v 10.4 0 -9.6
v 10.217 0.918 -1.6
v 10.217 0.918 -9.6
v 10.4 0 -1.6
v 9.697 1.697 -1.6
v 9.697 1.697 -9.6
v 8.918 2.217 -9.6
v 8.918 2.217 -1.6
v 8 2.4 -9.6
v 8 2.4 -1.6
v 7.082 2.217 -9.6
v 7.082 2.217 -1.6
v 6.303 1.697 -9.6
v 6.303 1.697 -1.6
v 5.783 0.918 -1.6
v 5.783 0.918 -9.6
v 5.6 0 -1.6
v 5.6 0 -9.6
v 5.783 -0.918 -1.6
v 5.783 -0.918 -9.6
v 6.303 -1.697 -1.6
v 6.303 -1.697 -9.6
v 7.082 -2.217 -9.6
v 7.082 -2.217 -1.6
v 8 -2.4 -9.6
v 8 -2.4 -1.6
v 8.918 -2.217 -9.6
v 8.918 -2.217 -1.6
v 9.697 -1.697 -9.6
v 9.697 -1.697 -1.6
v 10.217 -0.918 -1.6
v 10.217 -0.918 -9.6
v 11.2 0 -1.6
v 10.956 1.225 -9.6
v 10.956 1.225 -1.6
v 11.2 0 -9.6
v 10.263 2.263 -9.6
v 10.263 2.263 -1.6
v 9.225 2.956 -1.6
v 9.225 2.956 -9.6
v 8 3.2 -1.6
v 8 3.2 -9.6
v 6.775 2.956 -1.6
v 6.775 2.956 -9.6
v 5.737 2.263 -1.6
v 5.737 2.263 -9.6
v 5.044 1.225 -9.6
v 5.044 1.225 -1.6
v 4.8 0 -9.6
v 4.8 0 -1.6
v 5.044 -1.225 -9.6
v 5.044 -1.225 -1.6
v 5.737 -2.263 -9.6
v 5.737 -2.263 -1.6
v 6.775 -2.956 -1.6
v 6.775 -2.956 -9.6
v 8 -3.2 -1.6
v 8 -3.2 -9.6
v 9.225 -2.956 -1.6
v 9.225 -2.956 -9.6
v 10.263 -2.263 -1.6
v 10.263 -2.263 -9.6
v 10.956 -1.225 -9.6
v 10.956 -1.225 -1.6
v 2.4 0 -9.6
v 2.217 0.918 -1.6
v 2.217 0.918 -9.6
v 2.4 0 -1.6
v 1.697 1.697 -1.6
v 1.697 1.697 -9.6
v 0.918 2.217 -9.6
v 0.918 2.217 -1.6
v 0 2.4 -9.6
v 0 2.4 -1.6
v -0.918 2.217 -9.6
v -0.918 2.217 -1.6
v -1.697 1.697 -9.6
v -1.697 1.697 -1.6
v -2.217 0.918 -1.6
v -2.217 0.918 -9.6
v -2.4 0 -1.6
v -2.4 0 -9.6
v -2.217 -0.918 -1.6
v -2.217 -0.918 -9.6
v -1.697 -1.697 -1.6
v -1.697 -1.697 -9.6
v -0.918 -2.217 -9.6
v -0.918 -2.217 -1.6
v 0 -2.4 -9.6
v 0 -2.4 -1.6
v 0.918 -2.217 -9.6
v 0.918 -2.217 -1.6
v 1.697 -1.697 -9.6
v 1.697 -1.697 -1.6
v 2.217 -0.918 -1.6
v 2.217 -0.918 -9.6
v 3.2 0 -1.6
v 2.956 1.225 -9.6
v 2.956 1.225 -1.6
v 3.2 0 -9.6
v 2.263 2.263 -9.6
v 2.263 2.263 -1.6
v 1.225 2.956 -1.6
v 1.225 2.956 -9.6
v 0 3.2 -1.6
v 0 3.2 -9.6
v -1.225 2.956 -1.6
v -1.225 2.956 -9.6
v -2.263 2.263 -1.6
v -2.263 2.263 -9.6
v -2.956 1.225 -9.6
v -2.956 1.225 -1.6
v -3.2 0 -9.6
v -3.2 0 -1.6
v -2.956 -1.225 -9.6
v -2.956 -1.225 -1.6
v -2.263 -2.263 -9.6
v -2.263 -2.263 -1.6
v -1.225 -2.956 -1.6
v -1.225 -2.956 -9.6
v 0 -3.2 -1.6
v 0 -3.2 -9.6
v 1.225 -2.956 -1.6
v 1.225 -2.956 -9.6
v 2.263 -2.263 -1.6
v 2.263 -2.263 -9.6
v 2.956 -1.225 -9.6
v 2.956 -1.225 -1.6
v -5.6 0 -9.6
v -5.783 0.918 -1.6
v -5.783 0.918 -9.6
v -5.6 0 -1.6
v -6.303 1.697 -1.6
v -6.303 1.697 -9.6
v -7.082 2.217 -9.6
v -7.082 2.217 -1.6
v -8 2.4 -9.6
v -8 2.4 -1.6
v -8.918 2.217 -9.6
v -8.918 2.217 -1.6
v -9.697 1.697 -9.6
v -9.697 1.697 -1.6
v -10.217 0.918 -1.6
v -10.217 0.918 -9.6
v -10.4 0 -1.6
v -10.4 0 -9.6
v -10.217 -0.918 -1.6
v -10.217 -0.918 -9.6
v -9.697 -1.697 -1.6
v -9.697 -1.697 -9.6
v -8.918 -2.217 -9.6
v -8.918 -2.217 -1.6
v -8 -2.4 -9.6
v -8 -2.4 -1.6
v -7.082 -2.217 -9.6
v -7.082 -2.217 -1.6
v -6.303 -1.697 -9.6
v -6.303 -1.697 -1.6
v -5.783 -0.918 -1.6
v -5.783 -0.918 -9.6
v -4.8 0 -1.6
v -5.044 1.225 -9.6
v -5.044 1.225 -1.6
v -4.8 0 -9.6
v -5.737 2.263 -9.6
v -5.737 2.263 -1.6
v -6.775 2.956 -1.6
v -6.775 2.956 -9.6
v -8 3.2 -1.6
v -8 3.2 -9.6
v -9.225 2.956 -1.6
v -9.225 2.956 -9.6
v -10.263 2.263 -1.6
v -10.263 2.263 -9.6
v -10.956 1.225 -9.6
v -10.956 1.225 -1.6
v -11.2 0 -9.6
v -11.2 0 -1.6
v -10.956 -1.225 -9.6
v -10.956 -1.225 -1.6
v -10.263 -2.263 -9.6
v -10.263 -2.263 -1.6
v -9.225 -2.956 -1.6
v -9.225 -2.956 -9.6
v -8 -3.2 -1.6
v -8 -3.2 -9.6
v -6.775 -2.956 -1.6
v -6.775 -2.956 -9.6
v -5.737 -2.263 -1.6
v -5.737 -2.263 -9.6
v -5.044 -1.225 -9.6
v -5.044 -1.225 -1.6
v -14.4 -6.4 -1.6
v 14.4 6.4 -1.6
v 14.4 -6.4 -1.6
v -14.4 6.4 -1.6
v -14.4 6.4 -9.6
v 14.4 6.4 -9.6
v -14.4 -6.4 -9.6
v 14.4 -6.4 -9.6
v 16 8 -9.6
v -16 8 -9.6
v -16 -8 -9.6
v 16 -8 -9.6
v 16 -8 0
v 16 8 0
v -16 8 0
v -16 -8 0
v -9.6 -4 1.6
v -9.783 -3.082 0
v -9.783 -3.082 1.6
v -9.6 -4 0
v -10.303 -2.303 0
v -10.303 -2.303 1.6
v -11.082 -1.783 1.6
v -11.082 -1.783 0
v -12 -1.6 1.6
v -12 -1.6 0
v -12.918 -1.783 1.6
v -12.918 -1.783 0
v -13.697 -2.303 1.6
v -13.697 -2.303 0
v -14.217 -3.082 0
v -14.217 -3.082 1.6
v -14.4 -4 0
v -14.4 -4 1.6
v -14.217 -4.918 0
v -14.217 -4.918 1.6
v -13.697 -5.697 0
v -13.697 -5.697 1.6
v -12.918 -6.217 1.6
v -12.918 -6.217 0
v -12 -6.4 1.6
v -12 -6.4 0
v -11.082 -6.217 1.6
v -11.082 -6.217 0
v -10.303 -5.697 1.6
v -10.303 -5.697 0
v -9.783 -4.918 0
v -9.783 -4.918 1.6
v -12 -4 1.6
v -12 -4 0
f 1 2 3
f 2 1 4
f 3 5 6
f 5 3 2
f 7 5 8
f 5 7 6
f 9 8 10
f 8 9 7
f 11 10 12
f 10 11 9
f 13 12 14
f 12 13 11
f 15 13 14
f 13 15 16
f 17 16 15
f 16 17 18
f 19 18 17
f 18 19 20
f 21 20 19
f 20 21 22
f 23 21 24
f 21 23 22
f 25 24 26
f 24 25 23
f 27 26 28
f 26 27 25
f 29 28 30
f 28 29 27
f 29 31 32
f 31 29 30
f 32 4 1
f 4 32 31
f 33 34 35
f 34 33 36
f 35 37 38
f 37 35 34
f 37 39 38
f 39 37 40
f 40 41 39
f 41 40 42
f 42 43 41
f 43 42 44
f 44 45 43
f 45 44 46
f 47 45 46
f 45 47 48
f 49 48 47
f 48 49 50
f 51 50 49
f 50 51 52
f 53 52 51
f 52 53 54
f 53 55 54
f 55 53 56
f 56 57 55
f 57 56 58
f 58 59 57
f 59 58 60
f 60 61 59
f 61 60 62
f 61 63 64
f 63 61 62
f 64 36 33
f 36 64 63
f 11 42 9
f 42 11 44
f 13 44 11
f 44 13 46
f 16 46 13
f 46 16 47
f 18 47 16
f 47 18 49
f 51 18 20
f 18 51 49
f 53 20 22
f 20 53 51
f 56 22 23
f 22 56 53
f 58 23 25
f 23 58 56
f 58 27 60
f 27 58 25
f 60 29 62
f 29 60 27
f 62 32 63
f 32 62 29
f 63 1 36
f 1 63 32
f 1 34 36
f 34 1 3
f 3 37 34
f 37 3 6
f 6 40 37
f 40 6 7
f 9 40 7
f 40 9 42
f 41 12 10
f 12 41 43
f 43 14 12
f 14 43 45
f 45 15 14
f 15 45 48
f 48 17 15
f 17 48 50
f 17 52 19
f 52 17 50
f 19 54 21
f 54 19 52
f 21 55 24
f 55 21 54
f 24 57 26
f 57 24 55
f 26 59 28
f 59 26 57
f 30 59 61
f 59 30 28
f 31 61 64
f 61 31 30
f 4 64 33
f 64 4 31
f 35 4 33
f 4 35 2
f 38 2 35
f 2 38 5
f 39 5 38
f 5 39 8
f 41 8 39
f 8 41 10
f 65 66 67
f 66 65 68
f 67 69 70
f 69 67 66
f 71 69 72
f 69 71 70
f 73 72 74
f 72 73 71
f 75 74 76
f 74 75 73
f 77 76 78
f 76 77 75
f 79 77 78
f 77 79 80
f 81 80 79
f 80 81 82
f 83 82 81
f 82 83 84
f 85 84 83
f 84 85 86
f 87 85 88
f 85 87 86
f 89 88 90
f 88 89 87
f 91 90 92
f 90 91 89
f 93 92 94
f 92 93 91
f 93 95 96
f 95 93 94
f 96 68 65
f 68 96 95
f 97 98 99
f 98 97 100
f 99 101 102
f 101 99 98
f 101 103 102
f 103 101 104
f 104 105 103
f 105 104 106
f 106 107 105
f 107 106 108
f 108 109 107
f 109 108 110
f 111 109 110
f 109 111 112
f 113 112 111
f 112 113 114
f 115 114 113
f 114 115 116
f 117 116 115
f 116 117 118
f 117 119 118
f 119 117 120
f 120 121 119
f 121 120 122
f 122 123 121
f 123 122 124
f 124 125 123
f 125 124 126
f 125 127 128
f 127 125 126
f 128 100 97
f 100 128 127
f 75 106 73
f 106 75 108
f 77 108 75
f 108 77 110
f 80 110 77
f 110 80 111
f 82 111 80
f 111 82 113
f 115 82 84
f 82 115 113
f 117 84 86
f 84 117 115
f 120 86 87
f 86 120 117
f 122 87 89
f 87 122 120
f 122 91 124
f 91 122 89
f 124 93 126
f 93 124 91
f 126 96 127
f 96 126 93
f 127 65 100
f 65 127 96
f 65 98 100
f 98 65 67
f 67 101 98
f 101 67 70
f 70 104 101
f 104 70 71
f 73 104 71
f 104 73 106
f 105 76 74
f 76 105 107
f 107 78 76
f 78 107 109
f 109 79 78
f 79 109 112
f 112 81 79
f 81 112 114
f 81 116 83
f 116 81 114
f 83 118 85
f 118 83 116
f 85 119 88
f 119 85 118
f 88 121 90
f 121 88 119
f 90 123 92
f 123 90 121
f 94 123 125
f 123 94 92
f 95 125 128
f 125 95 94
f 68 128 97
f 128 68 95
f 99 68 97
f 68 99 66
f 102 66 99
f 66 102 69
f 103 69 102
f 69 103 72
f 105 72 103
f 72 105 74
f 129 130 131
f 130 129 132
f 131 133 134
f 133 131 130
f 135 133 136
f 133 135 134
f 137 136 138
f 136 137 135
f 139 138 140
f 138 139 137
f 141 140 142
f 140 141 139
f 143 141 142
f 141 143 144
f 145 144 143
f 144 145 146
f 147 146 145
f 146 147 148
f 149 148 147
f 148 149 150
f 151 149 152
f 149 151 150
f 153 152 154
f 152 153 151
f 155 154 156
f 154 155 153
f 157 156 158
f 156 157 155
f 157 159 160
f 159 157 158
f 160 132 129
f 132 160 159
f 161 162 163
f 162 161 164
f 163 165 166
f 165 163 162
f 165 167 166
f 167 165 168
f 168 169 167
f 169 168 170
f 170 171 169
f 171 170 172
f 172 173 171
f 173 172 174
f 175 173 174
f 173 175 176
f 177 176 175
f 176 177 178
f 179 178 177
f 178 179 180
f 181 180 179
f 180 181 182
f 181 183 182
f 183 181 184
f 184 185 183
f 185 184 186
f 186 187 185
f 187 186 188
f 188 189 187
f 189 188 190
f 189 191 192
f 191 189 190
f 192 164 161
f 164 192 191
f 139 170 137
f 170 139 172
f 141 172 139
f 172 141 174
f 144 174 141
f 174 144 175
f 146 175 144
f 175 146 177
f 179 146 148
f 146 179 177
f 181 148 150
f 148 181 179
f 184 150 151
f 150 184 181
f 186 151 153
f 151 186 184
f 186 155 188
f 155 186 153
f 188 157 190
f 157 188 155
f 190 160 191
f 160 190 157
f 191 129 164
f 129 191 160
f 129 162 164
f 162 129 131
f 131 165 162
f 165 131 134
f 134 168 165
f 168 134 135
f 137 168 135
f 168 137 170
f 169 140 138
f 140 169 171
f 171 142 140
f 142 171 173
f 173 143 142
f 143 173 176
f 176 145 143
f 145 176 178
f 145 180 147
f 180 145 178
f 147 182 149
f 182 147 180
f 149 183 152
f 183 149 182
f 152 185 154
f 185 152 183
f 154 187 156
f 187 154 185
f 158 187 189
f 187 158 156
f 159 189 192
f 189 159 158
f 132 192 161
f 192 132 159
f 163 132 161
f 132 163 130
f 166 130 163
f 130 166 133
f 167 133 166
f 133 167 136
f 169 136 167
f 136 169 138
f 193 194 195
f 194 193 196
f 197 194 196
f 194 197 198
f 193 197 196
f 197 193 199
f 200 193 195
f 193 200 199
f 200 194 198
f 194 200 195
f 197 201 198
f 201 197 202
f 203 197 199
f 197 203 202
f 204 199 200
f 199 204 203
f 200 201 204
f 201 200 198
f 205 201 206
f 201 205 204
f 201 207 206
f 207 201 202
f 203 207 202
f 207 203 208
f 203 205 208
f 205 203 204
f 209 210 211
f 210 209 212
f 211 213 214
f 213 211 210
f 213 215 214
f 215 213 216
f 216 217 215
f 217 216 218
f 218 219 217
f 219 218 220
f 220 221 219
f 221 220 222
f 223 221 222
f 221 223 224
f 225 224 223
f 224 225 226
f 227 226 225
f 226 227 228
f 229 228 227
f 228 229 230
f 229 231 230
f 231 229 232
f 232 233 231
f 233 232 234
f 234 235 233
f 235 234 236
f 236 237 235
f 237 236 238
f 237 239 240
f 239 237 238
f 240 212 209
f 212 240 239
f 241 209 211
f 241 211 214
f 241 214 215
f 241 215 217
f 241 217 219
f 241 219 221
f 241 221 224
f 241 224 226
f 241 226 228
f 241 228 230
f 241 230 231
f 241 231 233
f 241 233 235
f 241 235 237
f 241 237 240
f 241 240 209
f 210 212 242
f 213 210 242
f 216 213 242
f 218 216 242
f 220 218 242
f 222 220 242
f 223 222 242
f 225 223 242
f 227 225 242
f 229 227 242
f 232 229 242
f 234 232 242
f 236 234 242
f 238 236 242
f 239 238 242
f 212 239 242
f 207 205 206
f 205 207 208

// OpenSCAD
// file: ../p/4-4ring3.scad
use <../lib.scad>
$fa=1; $fs=0.2;
function ldraw_lib__4_4ring3(realsolid=false) = [
// 0 Ring  3 x 1.0
// 0 Name: 4-4ring3.dat
// 0 Author: James Jessiman
// 0 !LDRAW_ORG Primitive UPDATE 2009-01
// 0 !LICENSE Licensed under CC BY 2.0 and CC BY 4.0 : see CAreadme.txt
// 
// 0 BFC CERTIFY CCW
  [0,"BFC","CERTIFY"],
  [0,"BFC","CCW"],
// 
// 0 !HISTORY 1998-12-15 [PTadmin] Official Update 1998-10
// 0 !HISTORY 2002-04-05 [hafhead] Added BFC statement
// 0 !HISTORY 2002-04-25 [PTadmin] Official Update 2002-02
// 0 !HISTORY 2007-06-24 [PTadmin] Header formatted for Contributor Agreement
// 0 !HISTORY 2008-07-01 [PTadmin] Official Update 2008-01
// 0 !HISTORY 2008-08-26 [cwdee] Switch polygon winding and rename
// 0 !HISTORY 2009-05-02 [PTadmin] Official Update 2009-01
// 
// 
// 4 16 -1.5308 0 3.6956 -1.1481 0 2.7717 0 0 3 0 0 4
  [4,16,-1.5308,0,3.6956,-1.1481,0,2.7717,0,0,3,0,0,4],
// 4 16 -2.8284 0 2.8284 -2.1213 0 2.1213 -1.1481 0 2.7717 -1.5308 0 3.6956
  [4,16,-2.8284,0,2.8284,-2.1213,0,2.1213,-1.1481,0,2.7717,-1.5308,0,3.6956],
// 4 16 -3.6956 0 1.5308 -2.7717 0 1.1481 -2.1213 0 2.1213 -2.8284 0 2.8284
  [4,16,-3.6956,0,1.5308,-2.7717,0,1.1481,-2.1213,0,2.1213,-2.8284,0,2.8284],
// 4 16 -4 0 0 -3 0 0 -2.7717 0 1.1481 -3.6956 0 1.5308
  [4,16,-4,0,0,-3,0,0,-2.7717,0,1.1481,-3.6956,0,1.5308],
// 4 16 -3.6956 0 -1.5308 -2.7717 0 -1.1481 -3 0 0 -4 0 0
  [4,16,-3.6956,0,-1.5308,-2.7717,0,-1.1481,-3,0,0,-4,0,0],
// 4 16 -2.8284 0 -2.8284 -2.1213 0 -2.1213 -2.7717 0 -1.1481 -3.6956 0 -1.5308
  [4,16,-2.8284,0,-2.8284,-2.1213,0,-2.1213,-2.7717,0,-1.1481,-3.6956,0,-1.5308],
// 4 16 -1.5308 0 -3.6956 -1.1481 0 -2.7717 -2.1213 0 -2.1213 -2.8284 0 -2.8284
  [4,16,-1.5308,0,-3.6956,-1.1481,0,-2.7717,-2.1213,0,-2.1213,-2.8284,0,-2.8284],
// 4 16 0 0 -4 0 0 -3 -1.1481 0 -2.7717 -1.5308 0 -3.6956
  [4,16,0,0,-4,0,0,-3,-1.1481,0,-2.7717,-1.5308,0,-3.6956],
// 4 16 1.5308 0 -3.6956 1.1481 0 -2.7717 0 0 -3 0 0 -4
  [4,16,1.5308,0,-3.6956,1.1481,0,-2.7717,0,0,-3,0,0,-4],
// 4 16 2.8284 0 -2.8284 2.1213 0 -2.1213 1.1481 0 -2.7717 1.5308 0 -3.6956
  [4,16,2.8284,0,-2.8284,2.1213,0,-2.1213,1.1481,0,-2.7717,1.5308,0,-3.6956],
// 4 16 3.6956 0 -1.5308 2.7717 0 -1.1481 2.1213 0 -2.1213 2.8284 0 -2.8284
  [4,16,3.6956,0,-1.5308,2.7717,0,-1.1481,2.1213,0,-2.1213,2.8284,0,-2.8284],
// 4 16 4 0 0 3 0 0 2.7717 0 -1.1481 3.6956 0 -1.5308
  [4,16,4,0,0,3,0,0,2.7717,0,-1.1481,3.6956,0,-1.5308],
// 4 16 3.6956 0 1.5308 2.7717 0 1.1481 3 0 0 4 0 0
  [4,16,3.6956,0,1.5308,2.7717,0,1.1481,3,0,0,4,0,0],
// 4 16 2.8284 0 2.8284 2.1213 0 2.1213 2.7717 0 1.1481 3.6956 0 1.5308
  [4,16,2.8284,0,2.8284,2.1213,0,2.1213,2.7717,0,1.1481,3.6956,0,1.5308],
// 4 16 1.5308 0 3.6956 1.1481 0 2.7717 2.1213 0 2.1213 2.8284 0 2.8284
  [4,16,1.5308,0,3.6956,1.1481,0,2.7717,2.1213,0,2.1213,2.8284,0,2.8284],
// 4 16 0 0 4 0 0 3 1.1481 0 2.7717 1.5308 0 3.6956
  [4,16,0,0,4,0,0,3,1.1481,0,2.7717,1.5308,0,3.6956],
// 0
];
module ldraw_lib__4_4ring3(step=0, col=false, unit=2/5, alt=false, line=0.2, solid=!$preview)
    makepoly(ldraw_lib__4_4ring3(solid), step=step, col=col, unit=unit, alt=alt, line=line, solid=solid);
ldraw_lib__4_4ring3(line=0.2);
// file: ../p/4-4edge.scad
use <../lib.scad>
function ldraw_lib__4_4edge() = [
// 0 Circle 1.0
// 0 Name: 4-4edge.dat
// 0 Author: James Jessiman
// 0 !LDRAW_ORG Primitive UPDATE 2017-01
// 0 !LICENSE Licensed under CC BY 2.0 and CC BY 4.0 : see CAreadme.txt
// 
// 0 BFC CERTIFY CCW
  [0,"BFC","CERTIFY"],
  [0,"BFC","CCW"],
// 
// 0 !HISTORY 1998-12-15 [PTadmin] Official Update 1998-10
// 0 !HISTORY 2005-12-28 [PTadmin] Official Update 2005-01
// 0 !HISTORY 2007-06-24 [PTadmin] Header formatted for Contributor Agreement
// 0 !HISTORY 2008-07-01 [PTadmin] Official Update 2008-01
// 0 !HISTORY 2017-01-15 [Steffen] BFCed
// 0 !HISTORY 2017-12-30 [PTadmin] Official Update 2017-01
// 
// 
// 2 24 1 0 0 0.9239 0 0.3827
  [2,24,1,0,0,0.9239,0,0.3827],
// 2 24 0.9239 0 0.3827 0.7071 0 0.7071
  [2,24,0.9239,0,0.3827,0.7071,0,0.7071],
// 2 24 0.7071 0 0.7071 0.3827 0 0.9239
  [2,24,0.7071,0,0.7071,0.3827,0,0.9239],
// 2 24 0.3827 0 0.9239 0 0 1
  [2,24,0.3827,0,0.9239,0,0,1],
// 2 24 0 0 1 -0.3827 0 0.9239
  [2,24,0,0,1,-0.3827,0,0.9239],
// 2 24 -0.3827 0 0.9239 -0.7071 0 0.7071
  [2,24,-0.3827,0,0.9239,-0.7071,0,0.7071],
// 2 24 -0.7071 0 0.7071 -0.9239 0 0.3827
  [2,24,-0.7071,0,0.7071,-0.9239,0,0.3827],
// 2 24 -0.9239 0 0.3827 -1 0 -0
  [2,24,-0.9239,0,0.3827,-1,0,-0],
// 2 24 -1 0 -0 -0.9239 0 -0.3827
  [2,24,-1,0,-0,-0.9239,0,-0.3827],
// 2 24 -0.9239 0 -0.3827 -0.7071 0 -0.7071
  [2,24,-0.9239,0,-0.3827,-0.7071,0,-0.7071],
// 2 24 -0.7071 0 -0.7071 -0.3827 0 -0.9239
  [2,24,-0.7071,0,-0.7071,-0.3827,0,-0.9239],
// 2 24 -0.3827 0 -0.9239 0 0 -1
  [2,24,-0.3827,0,-0.9239,0,0,-1],
// 2 24 0 0 -1 0.3827 0 -0.9239
  [2,24,0,0,-1,0.3827,0,-0.9239],
// 2 24 0.3827 0 -0.9239 0.7071 0 -0.7071
  [2,24,0.3827,0,-0.9239,0.7071,0,-0.7071],
// 2 24 0.7071 0 -0.7071 0.9239 0 -0.3827
  [2,24,0.7071,0,-0.7071,0.9239,0,-0.3827],
// 2 24 0.9239 0 -0.3827 1 0 0
  [2,24,0.9239,0,-0.3827,1,0,0],
];
module ldraw_lib__4_4edge(step=0, col=false, unit=2/5, alt=false, line=0.2, solid=!$preview)
    makepoly(ldraw_lib__4_4edge(), step=step, col=col, unit=unit, alt=alt, line=line, solid=solid);
ldraw_lib__4_4edge(line=0.2);
// file: ../p/4-4disc.scad
use <../lib.scad>
function ldraw_lib__4_4disc() = [
// 0 Disc 1.0
// 0 Name: 4-4disc.dat
// 0 Author: James Jessiman
// 0 !LDRAW_ORG Primitive UPDATE 2002-02
// 0 !LICENSE Licensed under CC BY 2.0 and CC BY 4.0 : see CAreadme.txt
// 
// 0 BFC CERTIFY CCW
  [0,"BFC","CERTIFY"],
  [0,"BFC","CCW"],
// 
// 0 !HISTORY 1998-12-15 [PTadmin] Official Update 1998-10
// 0 !HISTORY 2002-03-23 [sbliss] Added BFC statement
// 0 !HISTORY 2002-04-25 [PTadmin] Official Update 2002-02
// 0 !HISTORY 2007-06-24 [PTadmin] Header formatted for Contributor Agreement
// 0 !HISTORY 2008-07-01 [PTadmin] Official Update 2008-01
// 
// 
// 3 16 0 0 0 1 0 0 0.9239 0 0.3827
  [3,16,0,0,0,1,0,0,0.9239,0,0.3827],
// 3 16 0 0 0 0.9239 0 0.3827 0.7071 0 0.7071
  [3,16,0,0,0,0.9239,0,0.3827,0.7071,0,0.7071],
// 3 16 0 0 0 0.7071 0 0.7071 0.3827 0 0.9239
  [3,16,0,0,0,0.7071,0,0.7071,0.3827,0,0.9239],
// 3 16 0 0 0 0.3827 0 0.9239 0 0 1
  [3,16,0,0,0,0.3827,0,0.9239,0,0,1],
// 3 16 0 0 0 0 0 1 -0.3827 0 0.9239
  [3,16,0,0,0,0,0,1,-0.3827,0,0.9239],
// 3 16 0 0 0 -0.3827 0 0.9239 -0.7071 0 0.7071
  [3,16,0,0,0,-0.3827,0,0.9239,-0.7071,0,0.7071],
// 3 16 0 0 0 -0.7071 0 0.7071 -0.9239 0 0.3827
  [3,16,0,0,0,-0.7071,0,0.7071,-0.9239,0,0.3827],
// 3 16 0 0 0 -0.9239 0 0.3827 -1 0 -0
  [3,16,0,0,0,-0.9239,0,0.3827,-1,0,-0],
// 3 16 0 0 0 -1 0 -0 -0.9239 0 -0.3827
  [3,16,0,0,0,-1,0,-0,-0.9239,0,-0.3827],
// 3 16 0 0 0 -0.9239 0 -0.3827 -0.7071 0 -0.7071
  [3,16,0,0,0,-0.9239,0,-0.3827,-0.7071,0,-0.7071],
// 3 16 0 0 0 -0.7071 0 -0.7071 -0.3827 0 -0.9239
  [3,16,0,0,0,-0.7071,0,-0.7071,-0.3827,0,-0.9239],
// 3 16 0 0 0 -0.3827 0 -0.9239 0 0 -1
  [3,16,0,0,0,-0.3827,0,-0.9239,0,0,-1],
// 3 16 0 0 0 0 0 -1 0.3827 0 -0.9239
  [3,16,0,0,0,0,0,-1,0.3827,0,-0.9239],
// 3 16 0 0 0 0.3827 0 -0.9239 0.7071 0 -0.7071
  [3,16,0,0,0,0.3827,0,-0.9239,0.7071,0,-0.7071],
// 3 16 0 0 0 0.7071 0 -0.7071 0.9239 0 -0.3827
  [3,16,0,0,0,0.7071,0,-0.7071,0.9239,0,-0.3827],
// 3 16 0 0 0 0.9239 0 -0.3827 1 0 0
  [3,16,0,0,0,0.9239,0,-0.3827,1,0,0],
// 0
];
module ldraw_lib__4_4disc(step=0, col=false, unit=2/5, alt=false, line=0.2, solid=!$preview)
    makepoly(ldraw_lib__4_4disc(), step=step, col=col, unit=unit, alt=alt, line=line, solid=solid);
ldraw_lib__4_4disc(line=0.2);
// file: ../p/4-4cyli.scad
use <../lib.scad>
$fa=1; $fs=0.2;
function ldraw_lib__4_4cyli(realsolid=false) = [
// 0 Cylinder 1.0
// 0 Name: 4-4cyli.dat
// 0 Author: James Jessiman
// 0 !LDRAW_ORG Primitive UPDATE 2005-01
// 0 !LICENSE Licensed under CC BY 2.0 and CC BY 4.0 : see CAreadme.txt
// 
// 0 BFC CERTIFY CCW
  [0,"BFC","CERTIFY"],
  [0,"BFC","CCW"],
// 
// 0 !HISTORY 1998-12-15 [PTadmin] Official Update 1998-10
// 0 !HISTORY 2002-03-23 [sbliss] Added BFC statement; merged headers from files in distributions LDraw 0.27 and Complete.
// 0 !HISTORY 2002-04-25 [PTadmin] Official Update 2002-02
// 0 !HISTORY 2004-12-14 [guyvivan] BFC CCW
// 0 !HISTORY 2005-12-28 [PTadmin] Official Update 2005-01
// 0 !HISTORY 2007-06-24 [PTadmin] Header formatted for Contributor Agreement
// 0 !HISTORY 2008-07-01 [PTadmin] Official Update 2008-01
// 
// 
// 4 16 1 1 0 0.9239 1 0.3827 0.9239 0 0.3827 1 0 0
  [4,16,1,1,0,0.9239,1,0.3827,0.9239,0,0.3827,1,0,0],
// 5 24 1 0 0 1 1 0 0.9239 0 0.3827 0.9239 0 -0.3827
  [5,24,1,0,0,1,1,0,0.9239,0,0.3827,0.9239,0,-0.3827],
// 4 16 0.9239 1 0.3827 0.7071 1 0.7071 0.7071 0 0.7071 0.9239 0 0.3827
  [4,16,0.9239,1,0.3827,0.7071,1,0.7071,0.7071,0,0.7071,0.9239,0,0.3827],
// 5 24 0.9239 0 0.3827 0.9239 1 0.3827 0.7071 0 0.7071 1 0 0
  [5,24,0.9239,0,0.3827,0.9239,1,0.3827,0.7071,0,0.7071,1,0,0],
// 4 16 0.7071 1 0.7071 0.3827 1 0.9239 0.3827 0 0.9239 0.7071 0 0.7071
  [4,16,0.7071,1,0.7071,0.3827,1,0.9239,0.3827,0,0.9239,0.7071,0,0.7071],
// 5 24 0.7071 0 0.7071 0.7071 1 0.7071 0.3827 0 0.9239 0.9239 0 0.3827
  [5,24,0.7071,0,0.7071,0.7071,1,0.7071,0.3827,0,0.9239,0.9239,0,0.3827],
// 4 16 0.3827 1 0.9239 0 1 1 0 0 1 0.3827 0 0.9239
  [4,16,0.3827,1,0.9239,0,1,1,0,0,1,0.3827,0,0.9239],
// 5 24 0.3827 0 0.9239 0.3827 1 0.9239 0 0 1 0.7071 0 0.7071
  [5,24,0.3827,0,0.9239,0.3827,1,0.9239,0,0,1,0.7071,0,0.7071],
// 4 16 0 1 1 -0.3827 1 0.9239 -0.3827 0 0.9239 0 0 1
  [4,16,0,1,1,-0.3827,1,0.9239,-0.3827,0,0.9239,0,0,1],
// 5 24 0 0 1 0 1 1 -0.3827 0 0.9239 0.3827 0 0.9239
  [5,24,0,0,1,0,1,1,-0.3827,0,0.9239,0.3827,0,0.9239],
// 4 16 -0.3827 1 0.9239 -0.7071 1 0.7071 -0.7071 0 0.7071 -0.3827 0 0.9239
  [4,16,-0.3827,1,0.9239,-0.7071,1,0.7071,-0.7071,0,0.7071,-0.3827,0,0.9239],
// 5 24 -0.3827 0 0.9239 -0.3827 1 0.9239 -0.7071 0 0.7071 0 0 1
  [5,24,-0.3827,0,0.9239,-0.3827,1,0.9239,-0.7071,0,0.7071,0,0,1],
// 4 16 -0.7071 1 0.7071 -0.9239 1 0.3827 -0.9239 0 0.3827 -0.7071 0 0.7071
  [4,16,-0.7071,1,0.7071,-0.9239,1,0.3827,-0.9239,0,0.3827,-0.7071,0,0.7071],
// 5 24 -0.7071 0 0.7071 -0.7071 1 0.7071 -0.9239 0 0.3827 -0.3827 0 0.9239
  [5,24,-0.7071,0,0.7071,-0.7071,1,0.7071,-0.9239,0,0.3827,-0.3827,0,0.9239],
// 4 16 -0.9239 1 0.3827 -1 1 0 -1 0 0 -0.9239 0 0.3827
  [4,16,-0.9239,1,0.3827,-1,1,0,-1,0,0,-0.9239,0,0.3827],
// 5 24 -0.9239 0 0.3827 -0.9239 1 0.3827 -1 0 0 -0.7071 0 0.7071
  [5,24,-0.9239,0,0.3827,-0.9239,1,0.3827,-1,0,0,-0.7071,0,0.7071],
// 4 16 -1 1 0 -0.9239 1 -0.3827 -0.9239 0 -0.3827 -1 0 0
  [4,16,-1,1,0,-0.9239,1,-0.3827,-0.9239,0,-0.3827,-1,0,0],
// 5 24 -1 0 0 -1 1 0 -0.9239 0 -0.3827 -0.9239 0 0.3827
  [5,24,-1,0,0,-1,1,0,-0.9239,0,-0.3827,-0.9239,0,0.3827],
// 4 16 -0.9239 1 -0.3827 -0.7071 1 -0.7071 -0.7071 0 -0.7071 -0.9239 0 -0.3827
  [4,16,-0.9239,1,-0.3827,-0.7071,1,-0.7071,-0.7071,0,-0.7071,-0.9239,0,-0.3827],
// 5 24 -0.9239 0 -0.3827 -0.9239 1 -0.3827 -0.7071 0 -0.7071 -1 0 0
  [5,24,-0.9239,0,-0.3827,-0.9239,1,-0.3827,-0.7071,0,-0.7071,-1,0,0],
// 4 16 -0.7071 1 -0.7071 -0.3827 1 -0.9239 -0.3827 0 -0.9239 -0.7071 0 -0.7071
  [4,16,-0.7071,1,-0.7071,-0.3827,1,-0.9239,-0.3827,0,-0.9239,-0.7071,0,-0.7071],
// 5 24 -0.7071 0 -0.7071 -0.7071 1 -0.7071 -0.3827 0 -0.9239 -0.9239 0 -0.3827
  [5,24,-0.7071,0,-0.7071,-0.7071,1,-0.7071,-0.3827,0,-0.9239,-0.9239,0,-0.3827],
// 4 16 -0.3827 1 -0.9239 0 1 -1 0 0 -1 -0.3827 0 -0.9239
  [4,16,-0.3827,1,-0.9239,0,1,-1,0,0,-1,-0.3827,0,-0.9239],
// 5 24 -0.3827 0 -0.9239 -0.3827 1 -0.9239 0 0 -1 -0.7071 0 -0.7071
  [5,24,-0.3827,0,-0.9239,-0.3827,1,-0.9239,0,0,-1,-0.7071,0,-0.7071],
// 4 16 0 1 -1 0.3827 1 -0.9239 0.3827 0 -0.9239 0 0 -1
  [4,16,0,1,-1,0.3827,1,-0.9239,0.3827,0,-0.9239,0,0,-1],
// 5 24 0 0 -1 0 1 -1 0.3827 0 -0.9239 -0.3827 0 -0.9239
  [5,24,0,0,-1,0,1,-1,0.3827,0,-0.9239,-0.3827,0,-0.9239],
// 4 16 0.3827 1 -0.9239 0.7071 1 -0.7071 0.7071 0 -0.7071 0.3827 0 -0.9239
  [4,16,0.3827,1,-0.9239,0.7071,1,-0.7071,0.7071,0,-0.7071,0.3827,0,-0.9239],
// 5 24 0.3827 0 -0.9239 0.3827 1 -0.9239 0.7071 0 -0.7071 0 0 -1
  [5,24,0.3827,0,-0.9239,0.3827,1,-0.9239,0.7071,0,-0.7071,0,0,-1],
// 4 16 0.7071 1 -0.7071 0.9239 1 -0.3827 0.9239 0 -0.3827 0.7071 0 -0.7071
  [4,16,0.7071,1,-0.7071,0.9239,1,-0.3827,0.9239,0,-0.3827,0.7071,0,-0.7071],
// 5 24 0.7071 0 -0.7071 0.7071 1 -0.7071 0.9239 0 -0.3827 0.3827 0 -0.9239
  [5,24,0.7071,0,-0.7071,0.7071,1,-0.7071,0.9239,0,-0.3827,0.3827,0,-0.9239],
// 4 16 0.9239 1 -0.3827 1 1 0 1 0 0 0.9239 0 -0.3827
  [4,16,0.9239,1,-0.3827,1,1,0,1,0,0,0.9239,0,-0.3827],
// 5 24 0.9239 0 -0.3827 0.9239 1 -0.3827 1 0 0 0.7071 0 -0.7071
  [5,24,0.9239,0,-0.3827,0.9239,1,-0.3827,1,0,0,0.7071,0,-0.7071],
// 0
];
module ldraw_lib__4_4cyli(step=0, col=false, unit=2/5, alt=false, line=0.2, solid=!$preview)
    makepoly(ldraw_lib__4_4cyli(solid), step=step, col=col, unit=unit, alt=alt, line=line, solid=solid);
ldraw_lib__4_4cyli(line=0.2);
// file: ../p/stud4.scad
use <../lib.scad>
use <4-4cyli.scad>
use <4-4edge.scad>
use <4-4ring3.scad>
function ldraw_lib__stud4() = [
// 0 Stud Tube Open
// 0 Name: stud4.dat
// 0 Author: James Jessiman
// 0 !LDRAW_ORG Primitive UPDATE 2009-02
// 0 !LICENSE Licensed under CC BY 4.0 : see CAreadme.txt
// 
// 0 BFC CERTIFY CCW
  [0,"BFC","CERTIFY"],
  [0,"BFC","CCW"],
// 
// 0 !HISTORY 1999-07-05 [PTadmin] Official Update 1999-05
// 0 !HISTORY 2002-04-04 [sbliss] Modified for BFC compliance
// 0 !HISTORY 2002-04-25 [PTadmin] Official Update 2002-02
// 0 !HISTORY 2007-06-24 [PTadmin] Header formatted for Contributor Agreement
// 0 !HISTORY 2008-07-01 [PTadmin] Official Update 2008-01
// 0 !HISTORY 2009-06-21 [cwdee] Update ring references to 4-4ring
// 0 !HISTORY 2009-09-03 [PTadmin] Official Update 2009-02
// 
// 
// 1 16 0 -4 0 6 0 0 0 1 0 0 0 6 4-4edge.dat
  [1,16,0,-4,0,6,0,0,0,1,0,0,0,6, ldraw_lib__4_4edge()],
// 1 16 0 -4 0 8 0 0 0 1 0 0 0 8 4-4edge.dat
  [1,16,0,-4,0,8,0,0,0,1,0,0,0,8, ldraw_lib__4_4edge()],
// 1 16 0 0 0 6 0 0 0 1 0 0 0 6 4-4edge.dat
  [1,16,0,0,0,6,0,0,0,1,0,0,0,6, ldraw_lib__4_4edge()],
// 1 16 0 0 0 8 0 0 0 1 0 0 0 8 4-4edge.dat
  [1,16,0,0,0,8,0,0,0,1,0,0,0,8, ldraw_lib__4_4edge()],
// 0 BFC INVERTNEXT
  [0,"BFC","INVERTNEXT"],
// 1 16 0 -4 0 6 0 0 0 4 0 0 0 6 4-4cyli.dat
  [1,16,0,-4,0,6,0,0,0,4,0,0,0,6, ldraw_lib__4_4cyli()],
// 1 16 0 -4 0 8 0 0 0 4 0 0 0 8 4-4cyli.dat
  [1,16,0,-4,0,8,0,0,0,4,0,0,0,8, ldraw_lib__4_4cyli()],
// 1 16 0 -4 0 2 0 0 0 1 0 0 0 2 4-4ring3.dat
  [1,16,0,-4,0,2,0,0,0,1,0,0,0,2, ldraw_lib__4_4ring3()],
  [-1,16,0,0,0,2,0,0,0,-1,0,0,0,2, ldraw_lib__4_4ring3()],
// 0
];
module ldraw_lib__stud4(step=0, col=false, unit=2/5, alt=false, line=0.2, solid=!$preview)
    makepoly(ldraw_lib__stud4(), step=step, col=col, unit=unit, alt=alt, line=line, solid=solid);
ldraw_lib__stud4(line=0.2);
// file: ../p/box5.scad
use <../lib.scad>
function ldraw_lib__box5() = [
// 0 Box with 5 Faces and All Edges
// 0 Name: box5.dat
// 0 Author: James Jessiman
// 0 !LDRAW_ORG Primitive UPDATE 2012-01
// 0 !LICENSE Licensed under CC BY 2.0 and CC BY 4.0 : see CAreadme.txt
// 
// 0 BFC CERTIFY CCW
  [0,"BFC","CERTIFY"],
  [0,"BFC","CCW"],
// 
// 0 !HISTORY 2002-04-03 [sbliss] Modified for BFC compliance
// 0 !HISTORY 2002-04-25 [PTadmin] Official Update 2002-02
// 0 !HISTORY 2007-06-24 [PTadmin] Header formatted for Contributor Agreement
// 0 !HISTORY 2008-07-01 [PTadmin] Official Update 2008-01
// 0 !HISTORY 2012-02-16 [Philo] Changed to CCW
// 0 !HISTORY 2012-03-30 [PTadmin] Official Update 2012-01
// 
// 
// 2 24 1 1 1 -1 1 1
  [2,24,1,1,1,-1,1,1],
// 2 24 -1 1 1 -1 1 -1
  [2,24,-1,1,1,-1,1,-1],
// 2 24 -1 1 -1 1 1 -1
  [2,24,-1,1,-1,1,1,-1],
// 2 24 1 1 -1 1 1 1
  [2,24,1,1,-1,1,1,1],
// 2 24 1 0 1 -1 0 1
  [2,24,1,0,1,-1,0,1],
// 2 24 -1 0 1 -1 0 -1
  [2,24,-1,0,1,-1,0,-1],
// 2 24 -1 0 -1 1 0 -1
  [2,24,-1,0,-1,1,0,-1],
// 2 24 1 0 -1 1 0 1
  [2,24,1,0,-1,1,0,1],
// 2 24 1 0 1 1 1 1
  [2,24,1,0,1,1,1,1],
// 2 24 -1 0 1 -1 1 1
  [2,24,-1,0,1,-1,1,1],
// 2 24 1 0 -1 1 1 -1
  [2,24,1,0,-1,1,1,-1],
// 2 24 -1 0 -1 -1 1 -1
  [2,24,-1,0,-1,-1,1,-1],
// 4 16 -1 1 1 1 1 1 1 1 -1 -1 1 -1
  [4,16,-1,1,1,1,1,1,1,1,-1,-1,1,-1],
// 4 16 -1 1 1 -1 0 1 1 0 1 1 1 1
  [4,16,-1,1,1,-1,0,1,1,0,1,1,1,1],
// 4 16 -1 1 -1 -1 0 -1 -1 0 1 -1 1 1
  [4,16,-1,1,-1,-1,0,-1,-1,0,1,-1,1,1],
// 4 16 1 1 -1 1 0 -1 -1 0 -1 -1 1 -1
  [4,16,1,1,-1,1,0,-1,-1,0,-1,-1,1,-1],
// 4 16 1 1 1 1 0 1 1 0 -1 1 1 -1
  [4,16,1,1,1,1,0,1,1,0,-1,1,1,-1],
];
makepoly(ldraw_lib__box5(), line=0.2);
// file: ../p/box4.scad
use <../lib.scad>
function ldraw_lib__box4() = [
// 0 Box with 4 Faces (2 Parallel Pairs) and All Edges
// 0 Name: box4.dat
// 0 Author: James Jessiman
// 0 !LDRAW_ORG Primitive UPDATE 2012-01
// 0 !LICENSE Licensed under CC BY 4.0 : see CAreadme.txt
// 
// 0 BFC CERTIFY CCW
  [0,"BFC","CERTIFY"],
  [0,"BFC","CCW"],
// 
// 0 !HISTORY 2002-04-03 [sbliss] Modified for BFC compliance
// 0 !HISTORY 2002-04-25 [PTadmin] Official Update 2002-02
// 0 !HISTORY 2007-06-24 [PTadmin] Header formatted for Contributor Agreement
// 0 !HISTORY 2008-07-01 [PTadmin] Official Update 2008-01
// 0 !HISTORY 2012-02-16 [Philo] Changed to CCW
// 0 !HISTORY 2012-03-30 [PTadmin] Official Update 2012-01
// 
// 
// 2 24 1 1 1 -1 1 1
  [2,24,1,1,1,-1,1,1],
// 2 24 -1 1 1 -1 1 -1
  [2,24,-1,1,1,-1,1,-1],
// 2 24 -1 1 -1 1 1 -1
  [2,24,-1,1,-1,1,1,-1],
// 2 24 1 1 -1 1 1 1
  [2,24,1,1,-1,1,1,1],
// 2 24 1 0 1 -1 0 1
  [2,24,1,0,1,-1,0,1],
// 2 24 -1 0 1 -1 0 -1
  [2,24,-1,0,1,-1,0,-1],
// 2 24 -1 0 -1 1 0 -1
  [2,24,-1,0,-1,1,0,-1],
// 2 24 1 0 -1 1 0 1
  [2,24,1,0,-1,1,0,1],
// 2 24 1 0 1 1 1 1
  [2,24,1,0,1,1,1,1],
// 2 24 -1 0 1 -1 1 1
  [2,24,-1,0,1,-1,1,1],
// 2 24 1 0 -1 1 1 -1
  [2,24,1,0,-1,1,1,-1],
// 2 24 -1 0 -1 -1 1 -1
  [2,24,-1,0,-1,-1,1,-1],
// 4 16 -1 1 1 -1 0 1 1 0 1 1 1 1
  [4,16,-1,1,1,-1,0,1,1,0,1,1,1,1],
// 4 16 -1 1 -1 -1 0 -1 -1 0 1 -1 1 1
  [4,16,-1,1,-1,-1,0,-1,-1,0,1,-1,1,1],
// 4 16 1 1 -1 1 0 -1 -1 0 -1 -1 1 -1
  [4,16,1,1,-1,1,0,-1,-1,0,-1,-1,1,-1],
// 4 16 1 1 1 1 0 1 1 0 -1 1 1 -1
  [4,16,1,1,1,1,0,1,1,0,-1,1,1,-1],
];
module ldraw_lib__box4(step=0, col=false, unit=2/5, alt=false, line=0.2, solid=!$preview)
    makepoly(ldraw_lib__box4(), step=step, col=col, unit=unit, alt=alt, line=line, solid=solid);
ldraw_lib__box4(line=0.2);
// file: ../p/stud.scad
use <../lib.scad>
use <4-4cyli.scad>
use <4-4disc.scad>
use <4-4edge.scad>
function ldraw_lib__stud() = [
// 0 Stud
// 0 Name: stud.dat
// 0 Author: James Jessiman
// 0 !LDRAW_ORG Primitive UPDATE 2012-01
// 0 !LICENSE Licensed under CC BY 4.0 : see CAreadme.txt
// 
// 0 BFC CERTIFY CCW
  [0,"BFC","CERTIFY"],
  [0,"BFC","CCW"],
// 
// 0 !HISTORY 2002-04-04 [sbliss] Modified for BFC compliance
// 0 !HISTORY 2002-04-25 [PTadmin] Official Update 2002-02
// 0 !HISTORY 2007-06-24 [PTadmin] Header formatted for Contributor Agreement
// 0 !HISTORY 2008-07-01 [PTadmin] Official Update 2008-01
// 0 !HISTORY 2012-02-16 [Philo] Changed to CCW
// 0 !HISTORY 2012-03-30 [PTadmin] Official Update 2012-01
// 
// 
// 1 16 0 0 0 6 0 0 0 1 0 0 0 6 4-4edge.dat
  [1,16,0,0,0,6,0,0,0,1,0,0,0,6, ldraw_lib__4_4edge()],
// 1 16 0 -4 0 6 0 0 0 1 0 0 0 6 4-4edge.dat
  [1,16,0,-4,0,6,0,0,0,1,0,0,0,6, ldraw_lib__4_4edge()],
// 1 16 0 0 0 6 0 0 0 -4 0 0 0 6 4-4cyli.dat
  [1,16,0,0,0,6,0,0,0,-4,0,0,0,6, ldraw_lib__4_4cyli()],
// 1 16 0 -4 0 6 0 0 0 1 0 0 0 6 4-4disc.dat
  [1,16,0,-4,0,6,0,0,0,1,0,0,0,6, ldraw_lib__4_4disc()],
  [-1,16,0,0,0,6,0,0,0,-1,0,0,0,6, ldraw_lib__4_4disc()],
];
module ldraw_lib__stud(step=0, col=false, unit=2/5, alt=false, line=0.2, solid=!$preview)
    makepoly(ldraw_lib__stud(), step=step, col=col, unit=unit, alt=alt, line=line, solid=solid);
ldraw_lib__stud(line=0.2);
// file: s/3001s02.scad
use <../../lib.scad>
use <../../p/box4.scad>
use <../../p/box5.scad>
use <../../p/stud4.scad>
function ldraw_lib__s__3001s02() = [
// 0 ~Brick  2 x  4 without Top and Top Studs
// 0 Name: s\3001s02.dat
// 0 Author: Rene Rechthaler [Blechtaler]
// 0 !LDRAW_ORG Subpart UPDATE 2024-09
// 0 !LICENSE Licensed under CC BY 4.0 : see CAreadme.txt
// 
// 0 BFC CERTIFY CCW
  [0,"BFC","CERTIFY"],
  [0,"BFC","CCW"],
// 
// 0 !HISTORY 2023-11-20 [Blechtaler] made from 3001s01
// 0 !HISTORY 2024-10-27 [OrionP] Official Update 2024-09
// 
// 1 16 20 4 0 1 0 0 0 -5 0 0 0 1 stud4.dat
  [1,16,20,4,0,1,0,0,0,-5,0,0,0,1, ldraw_lib__stud4()],
// 1 16 0 4 0 1 0 0 0 -5 0 0 0 1 stud4.dat
  [1,16,0,4,0,1,0,0,0,-5,0,0,0,1, ldraw_lib__stud4()],
// 1 16 -20 4 0 1 0 0 0 -5 0 0 0 1 stud4.dat
  [1,16,-20,4,0,1,0,0,0,-5,0,0,0,1, ldraw_lib__stud4()],
// 0 BFC INVERTNEXT
  [0,"BFC","INVERTNEXT"],
// 1 16 0 24 0 36 0 0 0 -20 0 0 0 16 box5.dat
  [1,16,0,24,0,36,0,0,0,-20,0,0,0,16, ldraw_lib__box5()],
// 4 16 40 24 20 36 24 16 -36 24 16 -40 24 20
  [4,16,40,24,20,36,24,16,-36,24,16,-40,24,20],
// 4 16 -40 24 20 -36 24 16 -36 24 -16 -40 24 -20
  [4,16,-40,24,20,-36,24,16,-36,24,-16,-40,24,-20],
// 4 16 -40 24 -20 -36 24 -16 36 24 -16 40 24 -20
  [4,16,-40,24,-20,-36,24,-16,36,24,-16,40,24,-20],
// 4 16 40 24 -20 36 24 -16 36 24 16 40 24 20
  [4,16,40,24,-20,36,24,-16,36,24,16,40,24,20],
// 1 16 0 24 0 0 0 40 0 -24 0 -20 0 0 box4.dat
  [1,16,0,24,0,0,0,40,0,-24,0,-20,0,0, ldraw_lib__box4()],
];
module ldraw_lib__s__3001s02(step=0, col=false, unit=2/5, alt=false, line=0.2, solid=!$preview)
    makepoly(ldraw_lib__s__3001s02(), step=step, col=col, unit=unit, alt=alt, line=line, solid=solid);
ldraw_lib__s__3001s02(line=0.2);
// main file
use <../lib.scad>
use <s/3001s02.scad>
use <../p/stud.scad>
function ldraw_lib__60189() = [
// 0 Brick Braille 2 x 4 with 1 Stud (DOTS-1)
// 0 Name: 60189.dat
// 0 Author: Jeff Jones [notmaster]
// 0 !LDRAW_ORG Part UPDATE 2025-08
// 0 !LICENSE Licensed under CC BY 4.0 : see CAreadme.txt
// 
// 0 BFC CERTIFY CCW
  [0,"BFC","CERTIFY"],
  [0,"BFC","CCW"],
// 
// 0 !KEYWORDS ⠁ Unicode U+2801 (10241)
// 
// 0 !HISTORY 2024-11-20 [Cheenzo] Changed origin and fixed rotation matrix
// 0 !HISTORY 2025-08-31 [OrionP] Official Update 2025-08
// 
// 1 16 0 0 0 1 0 0 0 1 0 0 0 1 s\3001s02.dat
  [1,16,0,0,0,1,0,0,0,1,0,0,0,1, ldraw_lib__s__3001s02()],
// 1 16 -30 0 -10 1 0 0 0 1 0 0 0 1 stud.dat
  [1,16,-30,0,-10,1,0,0,0,1,0,0,0,1, ldraw_lib__stud()],
// 4 16 -40 0 20 -40 0 -20 40 0 -20 40 0 20
  [4,16,-40,0,20,-40,0,-20,40,0,-20,40,0,20],
];
module ldraw_lib__60189(step=0, col=false, unit=2/5, alt=false, line=0.2, solid=!$preview)
    makepoly(ldraw_lib__60189(), step=step, col=col, unit=unit, alt=alt, line=line, solid=solid);
ldraw_lib__60189(line=0.2);
